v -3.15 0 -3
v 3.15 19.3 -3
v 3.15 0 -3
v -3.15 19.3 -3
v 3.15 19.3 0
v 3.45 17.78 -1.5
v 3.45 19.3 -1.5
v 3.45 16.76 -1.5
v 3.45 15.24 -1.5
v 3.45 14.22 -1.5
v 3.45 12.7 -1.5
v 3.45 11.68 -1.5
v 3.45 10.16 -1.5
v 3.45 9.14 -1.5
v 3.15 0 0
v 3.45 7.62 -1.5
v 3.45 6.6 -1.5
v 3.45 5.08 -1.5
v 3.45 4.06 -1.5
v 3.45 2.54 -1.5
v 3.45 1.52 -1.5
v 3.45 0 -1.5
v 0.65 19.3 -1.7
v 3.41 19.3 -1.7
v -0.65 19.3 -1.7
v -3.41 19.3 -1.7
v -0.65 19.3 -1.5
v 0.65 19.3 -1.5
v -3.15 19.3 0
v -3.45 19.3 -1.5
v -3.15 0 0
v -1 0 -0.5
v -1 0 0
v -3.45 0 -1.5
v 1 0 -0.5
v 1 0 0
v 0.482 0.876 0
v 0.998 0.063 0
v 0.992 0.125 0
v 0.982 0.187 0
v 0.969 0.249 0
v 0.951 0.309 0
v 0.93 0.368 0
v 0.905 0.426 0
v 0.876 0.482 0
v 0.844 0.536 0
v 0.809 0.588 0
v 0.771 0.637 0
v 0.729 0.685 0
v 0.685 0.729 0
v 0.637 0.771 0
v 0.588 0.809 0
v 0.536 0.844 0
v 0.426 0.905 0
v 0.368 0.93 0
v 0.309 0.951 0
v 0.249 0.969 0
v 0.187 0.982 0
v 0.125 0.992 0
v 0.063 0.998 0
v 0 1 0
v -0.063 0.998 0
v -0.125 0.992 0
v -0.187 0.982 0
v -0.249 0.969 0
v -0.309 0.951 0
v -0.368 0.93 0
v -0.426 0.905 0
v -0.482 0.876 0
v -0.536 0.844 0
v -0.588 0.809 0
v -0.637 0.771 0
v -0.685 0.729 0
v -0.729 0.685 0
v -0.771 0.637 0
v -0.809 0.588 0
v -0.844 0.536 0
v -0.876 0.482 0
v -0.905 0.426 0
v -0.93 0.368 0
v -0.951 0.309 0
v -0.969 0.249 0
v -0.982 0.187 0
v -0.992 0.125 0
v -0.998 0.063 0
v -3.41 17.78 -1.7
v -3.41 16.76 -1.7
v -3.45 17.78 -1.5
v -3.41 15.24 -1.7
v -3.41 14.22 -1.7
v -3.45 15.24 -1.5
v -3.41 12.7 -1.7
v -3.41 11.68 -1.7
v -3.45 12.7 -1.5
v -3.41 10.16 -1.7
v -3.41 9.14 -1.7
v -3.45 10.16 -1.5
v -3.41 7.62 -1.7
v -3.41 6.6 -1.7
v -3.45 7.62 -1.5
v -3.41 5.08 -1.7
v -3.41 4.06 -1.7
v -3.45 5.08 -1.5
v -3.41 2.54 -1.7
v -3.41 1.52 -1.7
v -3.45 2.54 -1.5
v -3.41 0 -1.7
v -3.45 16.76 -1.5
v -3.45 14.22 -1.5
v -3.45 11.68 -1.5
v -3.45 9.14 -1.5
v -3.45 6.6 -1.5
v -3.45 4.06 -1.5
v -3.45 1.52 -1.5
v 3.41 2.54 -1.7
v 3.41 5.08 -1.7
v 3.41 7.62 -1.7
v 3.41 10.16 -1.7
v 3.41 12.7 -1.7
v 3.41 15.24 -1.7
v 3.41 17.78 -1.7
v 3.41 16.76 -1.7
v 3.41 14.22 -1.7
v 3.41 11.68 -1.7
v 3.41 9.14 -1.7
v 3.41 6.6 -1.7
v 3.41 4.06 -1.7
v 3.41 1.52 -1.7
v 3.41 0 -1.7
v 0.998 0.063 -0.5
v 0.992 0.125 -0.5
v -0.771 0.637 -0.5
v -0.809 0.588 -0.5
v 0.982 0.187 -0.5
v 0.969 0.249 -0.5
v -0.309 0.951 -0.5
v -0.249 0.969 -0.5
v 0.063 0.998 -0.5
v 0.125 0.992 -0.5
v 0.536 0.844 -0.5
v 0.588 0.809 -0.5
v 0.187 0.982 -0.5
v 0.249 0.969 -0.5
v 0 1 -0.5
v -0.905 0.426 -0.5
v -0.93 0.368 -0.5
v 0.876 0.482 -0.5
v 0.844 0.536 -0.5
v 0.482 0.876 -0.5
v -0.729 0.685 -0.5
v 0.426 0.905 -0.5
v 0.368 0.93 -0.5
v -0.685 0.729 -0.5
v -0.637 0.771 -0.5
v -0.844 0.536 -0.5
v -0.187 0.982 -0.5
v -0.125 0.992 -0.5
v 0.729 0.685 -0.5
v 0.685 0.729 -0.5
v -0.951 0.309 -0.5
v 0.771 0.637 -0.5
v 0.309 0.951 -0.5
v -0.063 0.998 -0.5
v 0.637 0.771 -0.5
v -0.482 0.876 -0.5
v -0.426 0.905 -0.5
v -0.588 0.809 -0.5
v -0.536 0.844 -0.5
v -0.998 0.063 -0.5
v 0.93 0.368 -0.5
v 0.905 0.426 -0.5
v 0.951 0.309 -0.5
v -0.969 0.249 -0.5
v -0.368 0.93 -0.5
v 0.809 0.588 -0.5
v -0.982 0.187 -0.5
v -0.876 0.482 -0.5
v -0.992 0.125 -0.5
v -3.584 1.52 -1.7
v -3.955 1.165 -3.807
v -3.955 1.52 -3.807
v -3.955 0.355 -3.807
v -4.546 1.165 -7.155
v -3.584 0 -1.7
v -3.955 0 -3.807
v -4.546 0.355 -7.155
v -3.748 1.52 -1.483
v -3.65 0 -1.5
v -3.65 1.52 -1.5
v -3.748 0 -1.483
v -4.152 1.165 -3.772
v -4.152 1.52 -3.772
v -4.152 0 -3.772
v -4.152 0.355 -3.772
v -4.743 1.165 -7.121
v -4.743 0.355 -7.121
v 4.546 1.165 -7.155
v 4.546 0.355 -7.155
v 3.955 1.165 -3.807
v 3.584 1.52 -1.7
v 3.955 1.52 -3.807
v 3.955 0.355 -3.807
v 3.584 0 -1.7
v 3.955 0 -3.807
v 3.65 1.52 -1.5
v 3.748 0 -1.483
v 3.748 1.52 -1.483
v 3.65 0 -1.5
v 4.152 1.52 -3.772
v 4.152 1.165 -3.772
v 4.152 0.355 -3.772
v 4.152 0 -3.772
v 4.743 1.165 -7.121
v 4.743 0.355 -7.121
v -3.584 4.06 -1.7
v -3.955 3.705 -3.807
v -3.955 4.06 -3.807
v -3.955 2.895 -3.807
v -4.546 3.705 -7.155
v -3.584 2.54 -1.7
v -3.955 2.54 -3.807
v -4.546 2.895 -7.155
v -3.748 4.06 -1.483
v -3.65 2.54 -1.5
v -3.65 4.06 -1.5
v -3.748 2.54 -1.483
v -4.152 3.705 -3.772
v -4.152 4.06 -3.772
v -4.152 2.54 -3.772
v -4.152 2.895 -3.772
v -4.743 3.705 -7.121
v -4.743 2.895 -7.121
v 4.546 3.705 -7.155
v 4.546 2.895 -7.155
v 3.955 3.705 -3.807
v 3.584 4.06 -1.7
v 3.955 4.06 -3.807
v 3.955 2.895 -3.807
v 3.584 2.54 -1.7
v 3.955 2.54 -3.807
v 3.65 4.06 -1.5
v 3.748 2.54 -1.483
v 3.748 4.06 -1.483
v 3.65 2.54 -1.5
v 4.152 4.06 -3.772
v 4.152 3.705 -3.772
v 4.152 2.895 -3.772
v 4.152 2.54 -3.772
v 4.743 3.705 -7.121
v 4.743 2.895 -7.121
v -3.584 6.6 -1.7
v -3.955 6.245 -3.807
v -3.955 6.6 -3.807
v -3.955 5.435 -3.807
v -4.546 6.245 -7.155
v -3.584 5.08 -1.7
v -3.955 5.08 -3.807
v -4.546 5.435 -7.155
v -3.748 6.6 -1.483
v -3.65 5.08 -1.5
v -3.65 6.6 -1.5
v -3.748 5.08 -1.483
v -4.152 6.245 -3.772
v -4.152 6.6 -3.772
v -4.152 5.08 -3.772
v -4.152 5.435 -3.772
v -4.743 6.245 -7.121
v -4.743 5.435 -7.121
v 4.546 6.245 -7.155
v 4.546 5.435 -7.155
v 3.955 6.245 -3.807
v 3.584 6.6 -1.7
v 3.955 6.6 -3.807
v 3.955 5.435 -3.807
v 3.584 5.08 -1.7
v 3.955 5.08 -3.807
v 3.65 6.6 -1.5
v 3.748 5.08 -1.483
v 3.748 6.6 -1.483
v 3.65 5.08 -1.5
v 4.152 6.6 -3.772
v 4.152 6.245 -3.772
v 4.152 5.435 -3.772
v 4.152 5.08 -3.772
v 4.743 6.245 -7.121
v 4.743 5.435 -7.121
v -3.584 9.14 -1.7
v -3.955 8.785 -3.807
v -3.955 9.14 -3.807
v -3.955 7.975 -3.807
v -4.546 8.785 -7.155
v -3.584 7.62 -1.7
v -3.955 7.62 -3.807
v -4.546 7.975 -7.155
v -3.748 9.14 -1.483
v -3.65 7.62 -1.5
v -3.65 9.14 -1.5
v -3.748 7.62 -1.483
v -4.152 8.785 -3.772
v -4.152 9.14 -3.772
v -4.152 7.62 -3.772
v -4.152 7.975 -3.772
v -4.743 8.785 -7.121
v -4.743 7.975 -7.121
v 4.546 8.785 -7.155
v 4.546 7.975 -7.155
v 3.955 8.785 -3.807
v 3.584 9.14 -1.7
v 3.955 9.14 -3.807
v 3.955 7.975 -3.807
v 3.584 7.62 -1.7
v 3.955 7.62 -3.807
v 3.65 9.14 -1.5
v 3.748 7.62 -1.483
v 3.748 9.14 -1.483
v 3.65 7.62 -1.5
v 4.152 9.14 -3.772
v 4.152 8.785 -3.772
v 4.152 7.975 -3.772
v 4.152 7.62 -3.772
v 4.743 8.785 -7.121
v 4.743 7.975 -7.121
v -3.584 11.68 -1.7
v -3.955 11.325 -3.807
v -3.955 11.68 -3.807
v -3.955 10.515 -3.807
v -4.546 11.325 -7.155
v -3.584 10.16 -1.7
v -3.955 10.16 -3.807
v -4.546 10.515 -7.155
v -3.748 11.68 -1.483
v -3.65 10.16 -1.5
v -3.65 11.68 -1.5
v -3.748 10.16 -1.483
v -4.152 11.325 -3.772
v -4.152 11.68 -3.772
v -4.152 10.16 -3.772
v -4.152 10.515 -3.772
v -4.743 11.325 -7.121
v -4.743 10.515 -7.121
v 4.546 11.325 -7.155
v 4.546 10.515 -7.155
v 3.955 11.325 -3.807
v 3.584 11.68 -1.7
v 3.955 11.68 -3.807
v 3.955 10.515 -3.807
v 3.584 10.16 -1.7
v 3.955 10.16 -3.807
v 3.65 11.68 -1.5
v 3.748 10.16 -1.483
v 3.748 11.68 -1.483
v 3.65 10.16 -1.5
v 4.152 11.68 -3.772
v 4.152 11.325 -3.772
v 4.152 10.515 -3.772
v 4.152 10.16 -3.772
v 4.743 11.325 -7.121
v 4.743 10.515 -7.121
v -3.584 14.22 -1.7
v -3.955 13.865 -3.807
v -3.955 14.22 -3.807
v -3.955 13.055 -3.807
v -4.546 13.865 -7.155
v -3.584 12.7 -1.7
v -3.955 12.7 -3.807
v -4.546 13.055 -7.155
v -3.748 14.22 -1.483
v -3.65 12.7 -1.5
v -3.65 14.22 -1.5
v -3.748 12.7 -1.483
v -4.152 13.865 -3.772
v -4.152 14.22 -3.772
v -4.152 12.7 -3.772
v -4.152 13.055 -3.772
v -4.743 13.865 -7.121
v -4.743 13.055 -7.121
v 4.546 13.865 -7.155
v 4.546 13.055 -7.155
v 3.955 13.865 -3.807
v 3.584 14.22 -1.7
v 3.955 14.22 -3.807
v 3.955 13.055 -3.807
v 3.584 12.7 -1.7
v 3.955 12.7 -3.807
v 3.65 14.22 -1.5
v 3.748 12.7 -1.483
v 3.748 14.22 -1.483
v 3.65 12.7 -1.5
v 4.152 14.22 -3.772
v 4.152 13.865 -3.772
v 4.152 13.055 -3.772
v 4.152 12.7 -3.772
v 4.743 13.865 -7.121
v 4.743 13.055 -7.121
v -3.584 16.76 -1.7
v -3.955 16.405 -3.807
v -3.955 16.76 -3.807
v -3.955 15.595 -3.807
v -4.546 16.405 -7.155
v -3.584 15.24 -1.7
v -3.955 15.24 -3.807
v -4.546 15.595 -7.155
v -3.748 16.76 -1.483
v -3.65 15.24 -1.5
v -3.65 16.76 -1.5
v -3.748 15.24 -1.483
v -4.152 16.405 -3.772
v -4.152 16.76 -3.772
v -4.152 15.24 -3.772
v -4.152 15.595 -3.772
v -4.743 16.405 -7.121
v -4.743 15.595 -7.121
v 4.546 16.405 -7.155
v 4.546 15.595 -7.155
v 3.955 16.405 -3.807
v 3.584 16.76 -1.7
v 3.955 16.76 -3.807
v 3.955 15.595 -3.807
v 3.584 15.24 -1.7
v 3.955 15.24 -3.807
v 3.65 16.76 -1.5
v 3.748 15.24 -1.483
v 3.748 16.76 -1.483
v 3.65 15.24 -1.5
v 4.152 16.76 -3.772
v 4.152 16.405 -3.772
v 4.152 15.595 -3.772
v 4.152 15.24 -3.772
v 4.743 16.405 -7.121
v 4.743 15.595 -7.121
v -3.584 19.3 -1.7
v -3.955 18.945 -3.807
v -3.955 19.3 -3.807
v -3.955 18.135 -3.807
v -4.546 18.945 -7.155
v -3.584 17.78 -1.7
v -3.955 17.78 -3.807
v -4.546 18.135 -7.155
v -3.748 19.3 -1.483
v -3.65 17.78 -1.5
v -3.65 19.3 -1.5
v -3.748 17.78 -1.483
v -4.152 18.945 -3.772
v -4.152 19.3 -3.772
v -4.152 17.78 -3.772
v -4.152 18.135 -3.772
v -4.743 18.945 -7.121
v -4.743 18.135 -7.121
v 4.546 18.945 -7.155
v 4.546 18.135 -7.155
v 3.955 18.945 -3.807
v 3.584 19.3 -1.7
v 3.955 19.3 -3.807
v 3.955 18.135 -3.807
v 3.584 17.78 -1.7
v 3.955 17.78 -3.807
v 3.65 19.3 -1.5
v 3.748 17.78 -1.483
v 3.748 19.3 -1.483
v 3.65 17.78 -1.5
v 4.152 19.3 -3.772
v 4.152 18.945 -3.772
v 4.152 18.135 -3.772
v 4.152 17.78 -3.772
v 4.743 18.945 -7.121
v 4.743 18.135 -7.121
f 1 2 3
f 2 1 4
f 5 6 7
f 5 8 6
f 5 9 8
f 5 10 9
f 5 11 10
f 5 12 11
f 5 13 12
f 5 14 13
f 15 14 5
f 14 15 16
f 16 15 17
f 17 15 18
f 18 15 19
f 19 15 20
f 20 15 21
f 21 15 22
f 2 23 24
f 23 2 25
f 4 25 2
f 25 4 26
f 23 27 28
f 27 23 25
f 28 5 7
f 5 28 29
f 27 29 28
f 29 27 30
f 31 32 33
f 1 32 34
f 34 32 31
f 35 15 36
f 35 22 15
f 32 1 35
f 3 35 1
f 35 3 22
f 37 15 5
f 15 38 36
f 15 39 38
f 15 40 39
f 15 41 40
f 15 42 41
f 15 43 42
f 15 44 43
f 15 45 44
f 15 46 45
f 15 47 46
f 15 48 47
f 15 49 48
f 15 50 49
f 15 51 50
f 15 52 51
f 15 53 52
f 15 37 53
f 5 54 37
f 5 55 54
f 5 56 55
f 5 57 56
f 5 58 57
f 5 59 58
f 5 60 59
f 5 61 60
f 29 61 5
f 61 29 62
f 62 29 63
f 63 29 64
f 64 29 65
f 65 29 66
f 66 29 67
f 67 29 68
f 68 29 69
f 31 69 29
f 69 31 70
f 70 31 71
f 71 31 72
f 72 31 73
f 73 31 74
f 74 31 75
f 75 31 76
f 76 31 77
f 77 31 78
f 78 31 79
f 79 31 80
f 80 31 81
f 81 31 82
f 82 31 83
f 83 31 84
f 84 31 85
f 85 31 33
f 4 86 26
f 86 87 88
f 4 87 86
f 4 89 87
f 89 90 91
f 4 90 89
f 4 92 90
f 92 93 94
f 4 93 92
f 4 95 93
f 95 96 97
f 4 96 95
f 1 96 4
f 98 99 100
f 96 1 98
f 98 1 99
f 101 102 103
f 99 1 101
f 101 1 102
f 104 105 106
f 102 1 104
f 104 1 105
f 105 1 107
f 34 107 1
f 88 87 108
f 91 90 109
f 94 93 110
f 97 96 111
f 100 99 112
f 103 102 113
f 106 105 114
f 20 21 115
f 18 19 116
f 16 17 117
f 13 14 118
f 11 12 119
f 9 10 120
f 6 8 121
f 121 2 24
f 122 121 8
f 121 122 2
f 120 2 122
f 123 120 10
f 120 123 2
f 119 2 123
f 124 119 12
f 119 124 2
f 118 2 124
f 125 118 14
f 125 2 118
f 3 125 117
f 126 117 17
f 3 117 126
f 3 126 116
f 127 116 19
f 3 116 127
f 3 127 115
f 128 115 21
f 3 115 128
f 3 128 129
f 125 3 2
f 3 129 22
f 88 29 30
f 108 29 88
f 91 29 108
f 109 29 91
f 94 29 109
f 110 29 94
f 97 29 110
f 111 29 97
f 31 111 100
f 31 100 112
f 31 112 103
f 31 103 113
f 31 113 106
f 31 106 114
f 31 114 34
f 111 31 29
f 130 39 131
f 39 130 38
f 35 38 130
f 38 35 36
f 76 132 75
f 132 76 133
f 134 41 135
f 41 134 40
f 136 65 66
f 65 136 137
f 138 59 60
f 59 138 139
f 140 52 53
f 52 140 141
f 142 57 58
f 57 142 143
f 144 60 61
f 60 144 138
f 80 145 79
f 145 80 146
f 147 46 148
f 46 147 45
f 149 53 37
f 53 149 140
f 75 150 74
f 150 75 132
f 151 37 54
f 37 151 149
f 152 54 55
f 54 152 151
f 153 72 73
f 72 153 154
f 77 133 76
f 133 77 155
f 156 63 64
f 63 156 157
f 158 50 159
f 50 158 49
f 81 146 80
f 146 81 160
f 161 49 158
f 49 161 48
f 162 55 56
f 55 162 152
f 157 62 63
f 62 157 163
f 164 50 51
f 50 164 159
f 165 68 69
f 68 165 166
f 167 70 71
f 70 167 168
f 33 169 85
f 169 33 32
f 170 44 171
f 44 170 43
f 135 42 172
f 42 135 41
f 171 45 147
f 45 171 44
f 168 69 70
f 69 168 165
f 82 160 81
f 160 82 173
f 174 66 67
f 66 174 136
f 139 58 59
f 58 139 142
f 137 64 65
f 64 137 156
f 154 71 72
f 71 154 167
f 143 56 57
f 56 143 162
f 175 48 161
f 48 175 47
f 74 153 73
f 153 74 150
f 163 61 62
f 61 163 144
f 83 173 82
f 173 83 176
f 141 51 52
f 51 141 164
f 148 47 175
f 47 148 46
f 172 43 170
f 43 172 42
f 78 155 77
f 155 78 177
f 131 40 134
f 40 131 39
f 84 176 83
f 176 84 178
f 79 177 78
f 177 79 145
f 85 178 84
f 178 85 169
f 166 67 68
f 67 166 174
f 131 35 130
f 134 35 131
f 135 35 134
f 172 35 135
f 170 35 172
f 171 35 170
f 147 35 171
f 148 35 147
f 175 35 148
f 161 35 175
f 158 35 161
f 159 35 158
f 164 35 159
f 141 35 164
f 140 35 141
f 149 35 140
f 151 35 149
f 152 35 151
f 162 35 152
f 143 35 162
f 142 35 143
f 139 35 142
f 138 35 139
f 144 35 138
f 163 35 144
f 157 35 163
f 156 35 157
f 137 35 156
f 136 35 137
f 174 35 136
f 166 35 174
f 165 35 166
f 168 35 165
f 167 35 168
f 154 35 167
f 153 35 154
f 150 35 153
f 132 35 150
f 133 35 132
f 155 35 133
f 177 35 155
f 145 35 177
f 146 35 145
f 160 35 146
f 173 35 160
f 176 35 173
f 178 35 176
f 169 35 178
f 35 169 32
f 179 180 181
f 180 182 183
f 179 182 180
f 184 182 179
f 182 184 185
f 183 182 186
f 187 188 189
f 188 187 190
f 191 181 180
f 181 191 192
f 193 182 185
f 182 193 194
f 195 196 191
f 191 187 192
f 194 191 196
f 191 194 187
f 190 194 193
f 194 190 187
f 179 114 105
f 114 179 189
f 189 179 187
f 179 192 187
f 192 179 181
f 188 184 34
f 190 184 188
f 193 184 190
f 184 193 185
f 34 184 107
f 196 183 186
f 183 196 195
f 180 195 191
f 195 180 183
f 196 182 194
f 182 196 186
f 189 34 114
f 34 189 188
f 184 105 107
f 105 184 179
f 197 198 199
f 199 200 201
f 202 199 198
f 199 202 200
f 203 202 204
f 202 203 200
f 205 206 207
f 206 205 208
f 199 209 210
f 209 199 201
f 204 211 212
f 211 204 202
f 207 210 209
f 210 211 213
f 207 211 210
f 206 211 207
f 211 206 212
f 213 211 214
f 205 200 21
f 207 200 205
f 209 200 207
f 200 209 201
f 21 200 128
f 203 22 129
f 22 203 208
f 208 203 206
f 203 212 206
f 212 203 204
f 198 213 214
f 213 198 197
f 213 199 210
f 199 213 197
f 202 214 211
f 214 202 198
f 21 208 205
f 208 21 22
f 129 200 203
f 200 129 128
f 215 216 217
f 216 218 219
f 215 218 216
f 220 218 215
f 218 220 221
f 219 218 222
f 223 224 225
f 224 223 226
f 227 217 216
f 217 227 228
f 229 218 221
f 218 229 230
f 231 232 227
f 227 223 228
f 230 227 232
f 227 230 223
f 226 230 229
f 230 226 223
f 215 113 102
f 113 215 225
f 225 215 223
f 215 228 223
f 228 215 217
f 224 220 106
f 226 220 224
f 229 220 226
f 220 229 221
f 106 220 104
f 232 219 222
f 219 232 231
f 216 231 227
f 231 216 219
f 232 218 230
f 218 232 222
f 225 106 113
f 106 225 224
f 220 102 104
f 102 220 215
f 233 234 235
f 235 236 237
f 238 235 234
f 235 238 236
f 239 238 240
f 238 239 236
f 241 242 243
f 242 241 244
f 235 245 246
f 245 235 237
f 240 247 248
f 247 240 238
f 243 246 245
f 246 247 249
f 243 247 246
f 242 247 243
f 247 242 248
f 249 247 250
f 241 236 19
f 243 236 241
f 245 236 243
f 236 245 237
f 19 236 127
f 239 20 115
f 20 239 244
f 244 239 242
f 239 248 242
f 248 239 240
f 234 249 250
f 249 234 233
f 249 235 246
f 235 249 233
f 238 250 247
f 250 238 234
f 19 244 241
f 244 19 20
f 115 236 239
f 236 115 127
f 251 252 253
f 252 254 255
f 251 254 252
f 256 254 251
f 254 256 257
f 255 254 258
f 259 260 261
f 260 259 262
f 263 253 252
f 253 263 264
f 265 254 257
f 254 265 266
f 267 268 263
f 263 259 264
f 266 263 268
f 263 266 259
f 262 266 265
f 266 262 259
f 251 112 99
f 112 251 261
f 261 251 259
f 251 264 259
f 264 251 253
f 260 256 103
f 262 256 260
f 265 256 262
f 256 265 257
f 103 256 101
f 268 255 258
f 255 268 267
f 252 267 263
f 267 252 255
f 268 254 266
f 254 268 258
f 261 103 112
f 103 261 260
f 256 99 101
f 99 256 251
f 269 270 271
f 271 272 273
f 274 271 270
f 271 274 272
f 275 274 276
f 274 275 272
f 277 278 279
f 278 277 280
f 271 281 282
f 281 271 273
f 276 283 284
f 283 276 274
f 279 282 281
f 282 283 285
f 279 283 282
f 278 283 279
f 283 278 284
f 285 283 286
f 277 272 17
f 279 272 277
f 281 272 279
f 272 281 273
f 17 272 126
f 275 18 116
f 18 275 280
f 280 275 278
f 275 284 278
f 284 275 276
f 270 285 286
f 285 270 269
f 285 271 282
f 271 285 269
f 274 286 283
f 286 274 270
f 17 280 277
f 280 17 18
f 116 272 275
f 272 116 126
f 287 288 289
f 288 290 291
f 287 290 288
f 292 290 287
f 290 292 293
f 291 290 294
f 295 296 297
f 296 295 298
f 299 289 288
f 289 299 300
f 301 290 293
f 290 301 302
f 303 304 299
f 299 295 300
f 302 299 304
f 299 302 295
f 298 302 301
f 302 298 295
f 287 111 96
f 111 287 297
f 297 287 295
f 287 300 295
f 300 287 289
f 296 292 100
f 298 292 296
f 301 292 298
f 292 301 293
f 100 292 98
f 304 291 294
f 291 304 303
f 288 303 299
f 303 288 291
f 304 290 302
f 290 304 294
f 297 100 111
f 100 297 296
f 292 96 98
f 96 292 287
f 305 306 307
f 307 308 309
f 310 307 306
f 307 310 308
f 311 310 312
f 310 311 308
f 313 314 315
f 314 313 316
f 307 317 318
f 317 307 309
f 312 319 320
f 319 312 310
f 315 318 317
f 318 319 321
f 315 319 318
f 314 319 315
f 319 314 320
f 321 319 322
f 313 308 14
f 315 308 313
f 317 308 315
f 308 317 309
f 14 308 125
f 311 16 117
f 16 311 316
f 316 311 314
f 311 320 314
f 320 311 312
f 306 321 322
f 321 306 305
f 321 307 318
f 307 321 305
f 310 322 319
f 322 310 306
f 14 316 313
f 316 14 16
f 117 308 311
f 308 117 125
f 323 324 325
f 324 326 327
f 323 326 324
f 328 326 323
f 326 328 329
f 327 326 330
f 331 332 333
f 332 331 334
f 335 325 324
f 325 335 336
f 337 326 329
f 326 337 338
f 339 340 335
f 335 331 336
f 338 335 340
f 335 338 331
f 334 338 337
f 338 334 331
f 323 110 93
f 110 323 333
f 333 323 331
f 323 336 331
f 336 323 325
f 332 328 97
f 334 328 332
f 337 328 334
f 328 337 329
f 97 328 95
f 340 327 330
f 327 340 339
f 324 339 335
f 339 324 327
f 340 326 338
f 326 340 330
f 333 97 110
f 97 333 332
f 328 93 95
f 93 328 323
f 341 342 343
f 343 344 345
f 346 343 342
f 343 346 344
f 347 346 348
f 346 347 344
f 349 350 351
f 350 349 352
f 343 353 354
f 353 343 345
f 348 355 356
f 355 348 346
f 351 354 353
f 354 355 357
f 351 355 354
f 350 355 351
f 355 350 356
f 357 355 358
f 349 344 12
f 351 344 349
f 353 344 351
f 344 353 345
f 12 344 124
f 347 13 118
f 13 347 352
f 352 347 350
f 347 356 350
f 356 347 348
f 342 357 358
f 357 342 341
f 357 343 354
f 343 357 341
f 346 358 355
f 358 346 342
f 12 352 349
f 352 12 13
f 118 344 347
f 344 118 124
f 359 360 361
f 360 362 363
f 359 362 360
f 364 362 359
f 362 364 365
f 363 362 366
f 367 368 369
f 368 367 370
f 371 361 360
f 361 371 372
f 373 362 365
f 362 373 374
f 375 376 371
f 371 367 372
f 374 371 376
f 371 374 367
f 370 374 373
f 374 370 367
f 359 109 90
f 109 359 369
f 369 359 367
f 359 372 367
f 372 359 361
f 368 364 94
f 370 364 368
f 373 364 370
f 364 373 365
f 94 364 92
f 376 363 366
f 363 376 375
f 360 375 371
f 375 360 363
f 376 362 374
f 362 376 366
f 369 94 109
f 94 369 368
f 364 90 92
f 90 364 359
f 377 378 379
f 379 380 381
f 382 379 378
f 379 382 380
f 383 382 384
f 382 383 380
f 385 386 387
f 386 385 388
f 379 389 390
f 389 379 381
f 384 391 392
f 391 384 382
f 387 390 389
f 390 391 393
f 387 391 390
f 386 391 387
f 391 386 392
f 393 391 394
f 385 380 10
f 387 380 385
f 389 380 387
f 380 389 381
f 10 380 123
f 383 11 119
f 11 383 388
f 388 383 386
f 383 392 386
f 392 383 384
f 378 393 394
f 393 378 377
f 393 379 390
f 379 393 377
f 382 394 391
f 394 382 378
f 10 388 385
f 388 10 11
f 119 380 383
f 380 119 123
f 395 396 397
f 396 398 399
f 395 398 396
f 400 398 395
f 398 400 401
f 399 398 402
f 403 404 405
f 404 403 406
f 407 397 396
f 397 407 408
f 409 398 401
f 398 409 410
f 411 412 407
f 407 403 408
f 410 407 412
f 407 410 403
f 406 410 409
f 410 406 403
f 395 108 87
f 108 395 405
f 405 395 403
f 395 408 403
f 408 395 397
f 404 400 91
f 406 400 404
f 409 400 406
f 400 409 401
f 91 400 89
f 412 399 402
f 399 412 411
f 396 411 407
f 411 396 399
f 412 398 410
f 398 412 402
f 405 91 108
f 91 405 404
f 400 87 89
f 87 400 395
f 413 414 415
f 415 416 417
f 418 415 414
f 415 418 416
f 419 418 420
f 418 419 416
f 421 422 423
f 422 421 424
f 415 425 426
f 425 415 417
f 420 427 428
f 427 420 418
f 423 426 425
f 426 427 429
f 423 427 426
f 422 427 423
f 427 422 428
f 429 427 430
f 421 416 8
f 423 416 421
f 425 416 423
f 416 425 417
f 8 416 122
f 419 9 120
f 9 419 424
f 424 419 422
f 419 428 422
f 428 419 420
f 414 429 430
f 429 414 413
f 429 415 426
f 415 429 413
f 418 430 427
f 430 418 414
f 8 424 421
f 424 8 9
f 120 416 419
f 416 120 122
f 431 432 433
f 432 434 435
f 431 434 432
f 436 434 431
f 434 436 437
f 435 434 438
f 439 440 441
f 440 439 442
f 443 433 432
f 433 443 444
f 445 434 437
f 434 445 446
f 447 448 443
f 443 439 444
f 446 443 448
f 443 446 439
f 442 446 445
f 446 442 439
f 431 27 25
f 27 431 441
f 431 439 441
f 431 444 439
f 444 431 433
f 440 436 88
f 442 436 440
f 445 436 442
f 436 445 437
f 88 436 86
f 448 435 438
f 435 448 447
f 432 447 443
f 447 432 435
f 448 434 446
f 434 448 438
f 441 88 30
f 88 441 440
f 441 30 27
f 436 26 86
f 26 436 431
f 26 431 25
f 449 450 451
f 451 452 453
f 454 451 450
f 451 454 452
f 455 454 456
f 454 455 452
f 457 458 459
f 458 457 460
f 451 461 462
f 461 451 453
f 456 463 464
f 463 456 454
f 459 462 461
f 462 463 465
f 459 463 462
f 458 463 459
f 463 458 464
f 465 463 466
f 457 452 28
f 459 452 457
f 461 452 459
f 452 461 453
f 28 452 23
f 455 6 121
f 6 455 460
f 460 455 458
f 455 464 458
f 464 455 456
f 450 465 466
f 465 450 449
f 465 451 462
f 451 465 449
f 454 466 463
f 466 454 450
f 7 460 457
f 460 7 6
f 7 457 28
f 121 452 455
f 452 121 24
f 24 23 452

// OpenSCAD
chip_dip(legs=8);

/** 
 * Микросхема в корпусе DIP
 * @param legs количество ног (с одной стороны) 
 */
module chip_dip(legs=4) {
  // размеры корпуса DIP из спецификаций, например отсюда
  // http://www.chipdip.ru/info/dip-package-import-integrated-circuits/
      
  leg_base_width = 1.52;
  leg_base_height = 4.65/2;
  leg_pin_width = 0.81;
  leg_pin_height = 3.4;
  leg_step = 2.54;
    
  box_width=6.3;
  box_length=leg_step*(legs-1)+leg_base_width;
  box_height=3;
  box_brow=.3;
  
  // нога
  module leg() {
    translate([0, -leg_base_width/2, -0.2]) cube([3, leg_base_width, 0.2]);
    rotate([0, 10, 0]) union() {
      translate([-.1, -leg_base_width/2, -leg_base_height]) 
        cube([0.2, leg_base_width, leg_base_height]);
      translate([-.1, -leg_pin_width/2, -leg_base_height-leg_pin_height]) 
        cube([0.2, leg_pin_width, leg_pin_height]);
    }
  }
  
  
  // корпус
  difference() {
    //translate([-box_width/2, -leg_base_width/2, -box_height]) 
    //  cube([box_width, box_length, box_height]);
      
    // корпус - "гробик"
    translate([-box_width/2, 0, -box_height])
      polyhedron(
        points = [
          // основание
          [0, 0, 0], [box_width, 0, 0], [box_width, box_length, 0], [0, box_length, 0], 
          // середина
          [-box_brow, 0, box_height/2], 
          [box_width+box_brow, 0, box_height/2], 
          [box_width+box_brow, box_length, box_height/2], 
          [-box_brow, box_length, box_height/2], 
          // верх
          [0, 0, box_height], [box_width, 0, box_height], 
          [box_width, box_length, box_height], [0, box_length, box_height]
        ], 
        faces = [
          // основание
          [0,1,2,3],
          // нижний ряд
          [0,4,5,1], [1,5,6,2], [2,6,7,3], [3,7,4,0],
          // верхний ряд
          [4,8,9,5], [5,9,10,6], [6,10,11,7], [7,11,8,4],
          // верх
          [11,10,9,8]
        ]
      );
  
    // полукруглая выемка
    translate([0, 0, -.5]) cylinder(h=4, r=1, $fn=100);
    
    // в общем, незачем (визуально важен полукруг, чтобы определить,
    // где верх, а полная аутентичность со всеми выемками и надписями 
    // не нужна)
    
    // круглая ямка
    //translate([1.6, 1.6, -.1]) cylinder(h=0.1+0.1, r=0.5, $fn=100);
    
    // еще одна круглая ямка
    //translate([0, box_length-2, -.1]) cylinder(h=0.1+0.1, r=1, $fn=100);
  }
  
  // ноги
  for(i = [0 : legs-1]) {
    translate([-box_width/2-box_brow-0.2, leg_base_width/2 + leg_step*i, -box_height/2]) leg();
    mirror([1,0,0]) translate([-box_width/2-box_brow-0.2,, leg_base_width/2 + leg_step*i, -box_height/2]) leg();
  }
}
